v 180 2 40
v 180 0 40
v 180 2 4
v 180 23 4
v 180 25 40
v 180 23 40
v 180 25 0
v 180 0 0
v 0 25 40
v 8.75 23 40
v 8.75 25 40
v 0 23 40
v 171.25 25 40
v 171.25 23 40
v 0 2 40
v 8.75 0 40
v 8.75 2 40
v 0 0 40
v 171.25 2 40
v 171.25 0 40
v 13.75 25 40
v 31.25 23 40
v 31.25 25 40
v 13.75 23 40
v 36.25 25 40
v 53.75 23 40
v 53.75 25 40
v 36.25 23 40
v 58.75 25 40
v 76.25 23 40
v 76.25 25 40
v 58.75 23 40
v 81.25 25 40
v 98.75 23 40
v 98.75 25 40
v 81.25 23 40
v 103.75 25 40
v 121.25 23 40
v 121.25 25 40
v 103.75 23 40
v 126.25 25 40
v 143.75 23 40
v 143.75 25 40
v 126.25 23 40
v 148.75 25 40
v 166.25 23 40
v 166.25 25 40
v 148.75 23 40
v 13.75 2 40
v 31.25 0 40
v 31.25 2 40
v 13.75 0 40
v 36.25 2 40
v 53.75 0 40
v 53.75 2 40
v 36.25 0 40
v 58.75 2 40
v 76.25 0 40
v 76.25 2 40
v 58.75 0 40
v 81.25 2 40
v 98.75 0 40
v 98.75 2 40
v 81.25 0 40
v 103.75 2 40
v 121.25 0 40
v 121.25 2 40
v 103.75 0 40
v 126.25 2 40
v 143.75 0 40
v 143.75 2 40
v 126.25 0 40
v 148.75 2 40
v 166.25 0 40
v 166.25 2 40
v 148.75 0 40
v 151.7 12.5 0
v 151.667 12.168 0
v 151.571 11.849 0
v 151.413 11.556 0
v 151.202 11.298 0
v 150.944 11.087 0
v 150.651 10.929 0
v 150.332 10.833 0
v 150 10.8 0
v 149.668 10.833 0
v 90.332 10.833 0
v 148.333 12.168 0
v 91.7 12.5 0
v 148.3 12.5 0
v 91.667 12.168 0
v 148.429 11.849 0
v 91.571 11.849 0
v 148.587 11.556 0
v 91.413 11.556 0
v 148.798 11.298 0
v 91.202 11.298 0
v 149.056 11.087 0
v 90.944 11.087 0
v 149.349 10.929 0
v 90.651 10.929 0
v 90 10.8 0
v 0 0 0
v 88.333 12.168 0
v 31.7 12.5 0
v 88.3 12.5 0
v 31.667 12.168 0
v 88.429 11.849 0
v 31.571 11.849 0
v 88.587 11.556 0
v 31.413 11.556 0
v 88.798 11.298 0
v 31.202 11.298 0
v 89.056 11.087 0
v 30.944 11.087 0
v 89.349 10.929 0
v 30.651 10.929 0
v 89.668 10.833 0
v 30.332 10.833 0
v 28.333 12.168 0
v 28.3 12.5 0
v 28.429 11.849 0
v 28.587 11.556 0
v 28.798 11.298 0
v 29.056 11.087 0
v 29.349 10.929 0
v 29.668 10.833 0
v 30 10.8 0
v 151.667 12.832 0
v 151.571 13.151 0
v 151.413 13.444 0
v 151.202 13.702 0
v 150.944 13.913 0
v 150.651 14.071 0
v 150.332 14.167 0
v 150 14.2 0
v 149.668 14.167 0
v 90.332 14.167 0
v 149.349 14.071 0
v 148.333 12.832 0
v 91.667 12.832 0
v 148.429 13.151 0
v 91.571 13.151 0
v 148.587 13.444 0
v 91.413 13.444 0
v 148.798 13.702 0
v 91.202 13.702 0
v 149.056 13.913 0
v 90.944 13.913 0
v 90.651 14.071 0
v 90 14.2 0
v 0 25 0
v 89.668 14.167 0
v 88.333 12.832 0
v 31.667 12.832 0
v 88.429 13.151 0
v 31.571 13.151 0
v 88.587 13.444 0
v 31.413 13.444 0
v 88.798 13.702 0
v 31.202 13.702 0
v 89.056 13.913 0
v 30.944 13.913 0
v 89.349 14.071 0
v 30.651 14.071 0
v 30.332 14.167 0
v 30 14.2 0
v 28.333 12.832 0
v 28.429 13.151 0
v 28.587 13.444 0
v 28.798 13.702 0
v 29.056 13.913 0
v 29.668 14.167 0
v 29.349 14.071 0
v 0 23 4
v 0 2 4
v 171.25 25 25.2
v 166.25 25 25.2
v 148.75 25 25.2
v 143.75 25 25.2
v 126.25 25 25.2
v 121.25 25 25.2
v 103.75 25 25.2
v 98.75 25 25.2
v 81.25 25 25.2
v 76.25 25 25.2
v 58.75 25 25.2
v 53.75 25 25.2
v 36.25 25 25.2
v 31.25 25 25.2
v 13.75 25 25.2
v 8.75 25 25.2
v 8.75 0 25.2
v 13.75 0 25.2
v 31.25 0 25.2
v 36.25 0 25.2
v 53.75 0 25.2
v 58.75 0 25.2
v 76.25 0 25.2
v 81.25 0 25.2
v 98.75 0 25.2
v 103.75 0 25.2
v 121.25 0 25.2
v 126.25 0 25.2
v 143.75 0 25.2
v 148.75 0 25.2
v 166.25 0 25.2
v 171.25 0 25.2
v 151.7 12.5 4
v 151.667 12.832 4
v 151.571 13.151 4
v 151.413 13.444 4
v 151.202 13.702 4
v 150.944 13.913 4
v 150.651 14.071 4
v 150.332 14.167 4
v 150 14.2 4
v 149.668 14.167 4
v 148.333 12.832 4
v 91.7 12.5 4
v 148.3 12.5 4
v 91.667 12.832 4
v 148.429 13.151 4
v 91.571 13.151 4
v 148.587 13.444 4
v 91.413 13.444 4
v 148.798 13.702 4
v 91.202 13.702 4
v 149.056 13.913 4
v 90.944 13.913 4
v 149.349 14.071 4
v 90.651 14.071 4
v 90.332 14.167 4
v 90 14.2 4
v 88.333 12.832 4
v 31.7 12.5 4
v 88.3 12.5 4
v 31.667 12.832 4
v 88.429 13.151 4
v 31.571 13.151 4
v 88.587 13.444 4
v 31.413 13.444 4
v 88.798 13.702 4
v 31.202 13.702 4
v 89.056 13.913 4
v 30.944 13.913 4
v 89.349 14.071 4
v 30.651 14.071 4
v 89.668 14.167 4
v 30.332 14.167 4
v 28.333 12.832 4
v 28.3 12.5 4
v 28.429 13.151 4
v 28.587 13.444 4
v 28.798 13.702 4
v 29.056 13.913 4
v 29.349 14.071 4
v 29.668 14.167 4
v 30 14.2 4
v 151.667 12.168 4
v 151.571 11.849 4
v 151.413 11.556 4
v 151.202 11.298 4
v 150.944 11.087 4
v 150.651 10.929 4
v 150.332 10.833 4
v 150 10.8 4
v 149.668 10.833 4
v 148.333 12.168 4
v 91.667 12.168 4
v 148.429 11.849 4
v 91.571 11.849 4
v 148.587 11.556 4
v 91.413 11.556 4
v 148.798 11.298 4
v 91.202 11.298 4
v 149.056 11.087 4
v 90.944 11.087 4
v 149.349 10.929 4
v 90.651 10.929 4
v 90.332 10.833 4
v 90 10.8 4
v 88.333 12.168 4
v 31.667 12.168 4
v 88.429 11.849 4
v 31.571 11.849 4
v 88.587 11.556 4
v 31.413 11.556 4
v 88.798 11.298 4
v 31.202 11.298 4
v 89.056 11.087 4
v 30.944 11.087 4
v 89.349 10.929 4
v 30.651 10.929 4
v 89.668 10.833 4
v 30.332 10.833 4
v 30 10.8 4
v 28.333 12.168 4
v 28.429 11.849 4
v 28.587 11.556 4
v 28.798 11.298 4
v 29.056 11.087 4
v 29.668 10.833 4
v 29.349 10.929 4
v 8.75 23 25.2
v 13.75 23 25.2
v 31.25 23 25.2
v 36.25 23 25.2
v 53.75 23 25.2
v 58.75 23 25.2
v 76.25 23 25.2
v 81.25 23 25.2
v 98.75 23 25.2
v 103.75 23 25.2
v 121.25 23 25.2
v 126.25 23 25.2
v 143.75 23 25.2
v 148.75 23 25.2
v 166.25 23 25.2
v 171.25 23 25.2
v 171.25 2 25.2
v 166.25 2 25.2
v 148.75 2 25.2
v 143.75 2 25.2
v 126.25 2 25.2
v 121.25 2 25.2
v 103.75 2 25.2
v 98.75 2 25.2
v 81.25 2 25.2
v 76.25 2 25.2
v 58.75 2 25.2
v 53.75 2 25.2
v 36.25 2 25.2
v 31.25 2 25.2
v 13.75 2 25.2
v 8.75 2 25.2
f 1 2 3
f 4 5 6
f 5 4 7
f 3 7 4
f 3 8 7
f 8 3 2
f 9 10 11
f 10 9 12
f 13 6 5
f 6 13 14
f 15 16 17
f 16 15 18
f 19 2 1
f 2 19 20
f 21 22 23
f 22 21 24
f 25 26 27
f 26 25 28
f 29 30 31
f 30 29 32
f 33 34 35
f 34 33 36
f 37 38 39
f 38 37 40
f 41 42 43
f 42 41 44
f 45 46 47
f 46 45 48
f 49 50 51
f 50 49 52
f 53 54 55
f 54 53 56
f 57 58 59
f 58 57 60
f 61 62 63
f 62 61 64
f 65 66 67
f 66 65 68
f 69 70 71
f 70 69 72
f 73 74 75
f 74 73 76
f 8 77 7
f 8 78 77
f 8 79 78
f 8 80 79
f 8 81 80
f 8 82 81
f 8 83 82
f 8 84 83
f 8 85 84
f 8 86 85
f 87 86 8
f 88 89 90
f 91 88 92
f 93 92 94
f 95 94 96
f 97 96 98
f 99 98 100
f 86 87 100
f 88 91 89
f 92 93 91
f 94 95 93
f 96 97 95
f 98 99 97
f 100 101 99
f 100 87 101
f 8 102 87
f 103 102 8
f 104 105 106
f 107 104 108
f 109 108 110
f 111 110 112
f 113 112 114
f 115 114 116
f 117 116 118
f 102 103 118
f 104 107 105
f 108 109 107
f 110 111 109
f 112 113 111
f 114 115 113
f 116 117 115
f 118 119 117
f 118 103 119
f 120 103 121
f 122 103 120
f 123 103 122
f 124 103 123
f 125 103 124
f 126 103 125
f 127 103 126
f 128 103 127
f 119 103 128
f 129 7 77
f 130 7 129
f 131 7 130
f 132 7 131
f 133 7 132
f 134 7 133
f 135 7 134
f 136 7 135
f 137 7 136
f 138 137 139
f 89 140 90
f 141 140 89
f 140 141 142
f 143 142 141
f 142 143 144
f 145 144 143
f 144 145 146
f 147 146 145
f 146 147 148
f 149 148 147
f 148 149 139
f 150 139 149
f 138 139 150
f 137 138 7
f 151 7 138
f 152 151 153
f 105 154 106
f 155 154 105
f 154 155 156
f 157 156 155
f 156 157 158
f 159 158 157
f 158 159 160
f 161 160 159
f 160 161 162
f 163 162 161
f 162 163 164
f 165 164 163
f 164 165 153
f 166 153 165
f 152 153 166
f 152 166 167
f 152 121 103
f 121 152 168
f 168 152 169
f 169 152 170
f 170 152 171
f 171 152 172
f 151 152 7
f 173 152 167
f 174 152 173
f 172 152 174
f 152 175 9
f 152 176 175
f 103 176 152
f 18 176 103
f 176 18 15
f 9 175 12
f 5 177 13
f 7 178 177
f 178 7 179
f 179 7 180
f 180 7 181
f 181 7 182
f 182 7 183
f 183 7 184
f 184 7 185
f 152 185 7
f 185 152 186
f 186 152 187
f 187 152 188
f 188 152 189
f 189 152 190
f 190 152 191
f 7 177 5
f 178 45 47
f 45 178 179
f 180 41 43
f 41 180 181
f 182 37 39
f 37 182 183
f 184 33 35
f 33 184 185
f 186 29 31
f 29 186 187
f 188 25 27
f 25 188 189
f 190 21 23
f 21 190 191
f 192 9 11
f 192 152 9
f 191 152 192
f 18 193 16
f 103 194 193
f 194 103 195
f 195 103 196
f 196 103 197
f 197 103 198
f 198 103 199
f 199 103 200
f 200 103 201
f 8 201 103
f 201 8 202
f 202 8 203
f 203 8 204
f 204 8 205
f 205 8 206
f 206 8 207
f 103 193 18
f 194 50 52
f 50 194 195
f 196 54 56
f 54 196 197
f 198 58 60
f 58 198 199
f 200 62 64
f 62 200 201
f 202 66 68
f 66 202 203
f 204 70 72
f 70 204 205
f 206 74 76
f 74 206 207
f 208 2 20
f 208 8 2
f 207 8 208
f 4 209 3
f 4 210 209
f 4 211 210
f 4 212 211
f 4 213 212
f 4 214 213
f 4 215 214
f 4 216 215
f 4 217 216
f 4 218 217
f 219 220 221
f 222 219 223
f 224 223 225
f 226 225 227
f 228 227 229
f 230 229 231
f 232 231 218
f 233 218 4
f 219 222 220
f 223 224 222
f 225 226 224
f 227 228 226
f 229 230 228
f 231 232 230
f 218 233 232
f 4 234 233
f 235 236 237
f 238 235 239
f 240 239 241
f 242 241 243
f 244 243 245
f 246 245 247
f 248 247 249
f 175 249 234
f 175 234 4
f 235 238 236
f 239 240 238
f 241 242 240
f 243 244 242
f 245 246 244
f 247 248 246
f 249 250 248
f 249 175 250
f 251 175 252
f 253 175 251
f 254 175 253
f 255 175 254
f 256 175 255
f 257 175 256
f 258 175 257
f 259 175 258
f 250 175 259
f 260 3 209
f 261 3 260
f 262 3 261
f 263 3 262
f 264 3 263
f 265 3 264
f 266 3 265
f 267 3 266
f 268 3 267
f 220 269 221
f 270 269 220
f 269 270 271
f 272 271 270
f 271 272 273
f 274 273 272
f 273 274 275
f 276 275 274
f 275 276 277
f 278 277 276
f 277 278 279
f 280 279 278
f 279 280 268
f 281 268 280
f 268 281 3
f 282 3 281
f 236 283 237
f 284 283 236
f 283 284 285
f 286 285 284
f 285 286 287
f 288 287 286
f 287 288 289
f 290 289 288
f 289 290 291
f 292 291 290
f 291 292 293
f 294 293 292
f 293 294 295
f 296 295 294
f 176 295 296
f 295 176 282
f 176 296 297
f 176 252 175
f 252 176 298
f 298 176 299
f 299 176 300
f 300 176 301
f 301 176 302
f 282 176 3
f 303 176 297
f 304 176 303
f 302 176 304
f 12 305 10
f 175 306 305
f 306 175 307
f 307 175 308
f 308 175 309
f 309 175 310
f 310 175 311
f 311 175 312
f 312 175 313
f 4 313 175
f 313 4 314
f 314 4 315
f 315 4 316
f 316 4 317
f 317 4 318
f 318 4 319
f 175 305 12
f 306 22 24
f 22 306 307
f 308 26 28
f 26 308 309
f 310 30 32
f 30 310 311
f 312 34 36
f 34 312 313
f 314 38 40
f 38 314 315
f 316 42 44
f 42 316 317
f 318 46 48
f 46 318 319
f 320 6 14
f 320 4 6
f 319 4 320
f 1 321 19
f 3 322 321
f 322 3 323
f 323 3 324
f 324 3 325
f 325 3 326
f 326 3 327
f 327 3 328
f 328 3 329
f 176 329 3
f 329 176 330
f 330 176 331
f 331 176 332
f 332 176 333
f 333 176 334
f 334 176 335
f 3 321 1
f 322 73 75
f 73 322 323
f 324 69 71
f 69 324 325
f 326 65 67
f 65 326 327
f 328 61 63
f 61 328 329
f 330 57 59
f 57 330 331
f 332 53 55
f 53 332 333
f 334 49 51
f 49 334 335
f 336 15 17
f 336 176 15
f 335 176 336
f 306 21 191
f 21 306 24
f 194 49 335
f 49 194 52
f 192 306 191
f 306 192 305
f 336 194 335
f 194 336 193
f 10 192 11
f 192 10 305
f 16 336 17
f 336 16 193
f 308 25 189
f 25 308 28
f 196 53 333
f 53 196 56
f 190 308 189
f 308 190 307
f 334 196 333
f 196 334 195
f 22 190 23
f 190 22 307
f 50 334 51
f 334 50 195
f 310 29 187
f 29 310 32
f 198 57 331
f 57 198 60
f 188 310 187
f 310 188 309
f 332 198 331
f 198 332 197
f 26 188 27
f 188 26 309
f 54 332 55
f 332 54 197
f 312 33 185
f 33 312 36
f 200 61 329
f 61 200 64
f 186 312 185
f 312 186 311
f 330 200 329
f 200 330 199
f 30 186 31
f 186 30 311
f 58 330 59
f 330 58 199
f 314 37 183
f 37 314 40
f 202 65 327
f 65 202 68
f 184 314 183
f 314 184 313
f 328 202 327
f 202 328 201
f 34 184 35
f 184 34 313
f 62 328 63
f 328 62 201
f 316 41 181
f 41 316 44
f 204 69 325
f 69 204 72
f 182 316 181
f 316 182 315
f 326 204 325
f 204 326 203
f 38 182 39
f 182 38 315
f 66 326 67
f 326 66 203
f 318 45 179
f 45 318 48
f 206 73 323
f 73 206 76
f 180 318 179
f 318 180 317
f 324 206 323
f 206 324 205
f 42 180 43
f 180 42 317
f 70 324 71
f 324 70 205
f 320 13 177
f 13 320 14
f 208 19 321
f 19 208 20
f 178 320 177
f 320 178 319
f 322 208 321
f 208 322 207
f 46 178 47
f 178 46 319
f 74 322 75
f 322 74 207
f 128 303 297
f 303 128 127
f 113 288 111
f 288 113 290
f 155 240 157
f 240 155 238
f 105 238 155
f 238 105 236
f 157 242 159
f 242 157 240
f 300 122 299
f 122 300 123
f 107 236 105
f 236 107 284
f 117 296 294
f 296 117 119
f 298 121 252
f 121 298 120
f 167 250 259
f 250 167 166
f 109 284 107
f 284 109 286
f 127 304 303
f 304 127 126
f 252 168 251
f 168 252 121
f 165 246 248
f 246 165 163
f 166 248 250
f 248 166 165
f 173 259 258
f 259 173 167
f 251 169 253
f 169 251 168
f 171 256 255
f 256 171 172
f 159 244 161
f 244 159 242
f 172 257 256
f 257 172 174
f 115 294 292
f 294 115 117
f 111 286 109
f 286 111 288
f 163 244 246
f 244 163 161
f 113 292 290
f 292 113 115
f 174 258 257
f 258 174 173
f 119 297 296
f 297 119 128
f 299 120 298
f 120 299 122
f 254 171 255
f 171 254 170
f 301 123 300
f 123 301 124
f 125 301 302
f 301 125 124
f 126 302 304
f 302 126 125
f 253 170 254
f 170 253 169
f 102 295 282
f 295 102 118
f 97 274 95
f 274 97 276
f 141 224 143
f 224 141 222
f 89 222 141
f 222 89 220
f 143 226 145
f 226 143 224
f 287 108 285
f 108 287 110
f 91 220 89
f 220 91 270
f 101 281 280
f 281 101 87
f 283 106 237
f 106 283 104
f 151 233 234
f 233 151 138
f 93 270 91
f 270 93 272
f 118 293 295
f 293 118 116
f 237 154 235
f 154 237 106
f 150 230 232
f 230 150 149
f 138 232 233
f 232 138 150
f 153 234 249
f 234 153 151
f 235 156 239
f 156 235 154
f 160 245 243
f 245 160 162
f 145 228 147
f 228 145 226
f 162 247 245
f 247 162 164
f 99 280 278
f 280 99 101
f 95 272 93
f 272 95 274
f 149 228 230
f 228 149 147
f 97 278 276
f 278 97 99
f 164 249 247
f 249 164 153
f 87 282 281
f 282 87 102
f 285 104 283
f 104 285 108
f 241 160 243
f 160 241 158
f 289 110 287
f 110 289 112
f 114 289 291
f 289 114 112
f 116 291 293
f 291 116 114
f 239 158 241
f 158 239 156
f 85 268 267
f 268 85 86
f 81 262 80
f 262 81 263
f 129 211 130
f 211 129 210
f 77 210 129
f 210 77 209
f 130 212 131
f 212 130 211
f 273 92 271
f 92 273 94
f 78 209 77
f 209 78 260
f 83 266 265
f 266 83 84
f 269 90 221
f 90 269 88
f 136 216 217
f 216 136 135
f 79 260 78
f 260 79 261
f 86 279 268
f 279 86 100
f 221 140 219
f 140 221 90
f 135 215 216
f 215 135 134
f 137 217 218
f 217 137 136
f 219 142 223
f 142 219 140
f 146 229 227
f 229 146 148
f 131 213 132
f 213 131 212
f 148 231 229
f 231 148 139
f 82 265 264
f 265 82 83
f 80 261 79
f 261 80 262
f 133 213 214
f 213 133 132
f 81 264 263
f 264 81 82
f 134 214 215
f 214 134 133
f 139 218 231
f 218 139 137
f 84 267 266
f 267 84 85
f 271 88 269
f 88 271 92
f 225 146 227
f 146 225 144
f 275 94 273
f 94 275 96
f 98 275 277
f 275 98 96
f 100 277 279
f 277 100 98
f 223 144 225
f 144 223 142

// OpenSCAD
$fn = 32;

// ----------------------------------------------------------------------
// Cable duct: 180 x 25 x 40 mm, 8 fingers
// ----------------------------------------------------------------------

// --- parameters (mm) ---
duct_len = 180;           // duct length, X
duct_w = 25;              // duct width, Y
duct_h = 40;              // duct height, Z
wall_t = 2;               // side wall thickness
floor_t = 4;              // floor thickness
slot_w = 5;               // finger slot width
slot_h = 21.2;            // finger slot height
fingers = 8;              // number of finger slots per side
pitch = 22.5;             // finger pitch
hole_d = 3.4;             // floor mounting hole
hole_n = 3;               // mounting holes in the floor

module shell() {
  difference() {
    cube([duct_len, duct_w, duct_h]);
    /* open top channel */
    translate([-wall_t - 1, wall_t, floor_t])
      cube([duct_len + 2 * wall_t + 2, duct_w - 2 * wall_t, duct_h + 1]);
  }
}

difference() {
  union() {
    shell();
  }
  /* finger slots cut through both side walls */
  for (i = [0 : fingers - 1]) translate([pitch / 2 + i * pitch - slot_w / 2, -1, floor_t + slot_h]) cube([slot_w, duct_w + 2, duct_h]);
  for (i = [0 : hole_n - 1]) translate([(duct_len / hole_n) * (i + 0.5), duct_w / 2, -1]) cylinder(h = floor_t + 2, d = hole_d);
}
